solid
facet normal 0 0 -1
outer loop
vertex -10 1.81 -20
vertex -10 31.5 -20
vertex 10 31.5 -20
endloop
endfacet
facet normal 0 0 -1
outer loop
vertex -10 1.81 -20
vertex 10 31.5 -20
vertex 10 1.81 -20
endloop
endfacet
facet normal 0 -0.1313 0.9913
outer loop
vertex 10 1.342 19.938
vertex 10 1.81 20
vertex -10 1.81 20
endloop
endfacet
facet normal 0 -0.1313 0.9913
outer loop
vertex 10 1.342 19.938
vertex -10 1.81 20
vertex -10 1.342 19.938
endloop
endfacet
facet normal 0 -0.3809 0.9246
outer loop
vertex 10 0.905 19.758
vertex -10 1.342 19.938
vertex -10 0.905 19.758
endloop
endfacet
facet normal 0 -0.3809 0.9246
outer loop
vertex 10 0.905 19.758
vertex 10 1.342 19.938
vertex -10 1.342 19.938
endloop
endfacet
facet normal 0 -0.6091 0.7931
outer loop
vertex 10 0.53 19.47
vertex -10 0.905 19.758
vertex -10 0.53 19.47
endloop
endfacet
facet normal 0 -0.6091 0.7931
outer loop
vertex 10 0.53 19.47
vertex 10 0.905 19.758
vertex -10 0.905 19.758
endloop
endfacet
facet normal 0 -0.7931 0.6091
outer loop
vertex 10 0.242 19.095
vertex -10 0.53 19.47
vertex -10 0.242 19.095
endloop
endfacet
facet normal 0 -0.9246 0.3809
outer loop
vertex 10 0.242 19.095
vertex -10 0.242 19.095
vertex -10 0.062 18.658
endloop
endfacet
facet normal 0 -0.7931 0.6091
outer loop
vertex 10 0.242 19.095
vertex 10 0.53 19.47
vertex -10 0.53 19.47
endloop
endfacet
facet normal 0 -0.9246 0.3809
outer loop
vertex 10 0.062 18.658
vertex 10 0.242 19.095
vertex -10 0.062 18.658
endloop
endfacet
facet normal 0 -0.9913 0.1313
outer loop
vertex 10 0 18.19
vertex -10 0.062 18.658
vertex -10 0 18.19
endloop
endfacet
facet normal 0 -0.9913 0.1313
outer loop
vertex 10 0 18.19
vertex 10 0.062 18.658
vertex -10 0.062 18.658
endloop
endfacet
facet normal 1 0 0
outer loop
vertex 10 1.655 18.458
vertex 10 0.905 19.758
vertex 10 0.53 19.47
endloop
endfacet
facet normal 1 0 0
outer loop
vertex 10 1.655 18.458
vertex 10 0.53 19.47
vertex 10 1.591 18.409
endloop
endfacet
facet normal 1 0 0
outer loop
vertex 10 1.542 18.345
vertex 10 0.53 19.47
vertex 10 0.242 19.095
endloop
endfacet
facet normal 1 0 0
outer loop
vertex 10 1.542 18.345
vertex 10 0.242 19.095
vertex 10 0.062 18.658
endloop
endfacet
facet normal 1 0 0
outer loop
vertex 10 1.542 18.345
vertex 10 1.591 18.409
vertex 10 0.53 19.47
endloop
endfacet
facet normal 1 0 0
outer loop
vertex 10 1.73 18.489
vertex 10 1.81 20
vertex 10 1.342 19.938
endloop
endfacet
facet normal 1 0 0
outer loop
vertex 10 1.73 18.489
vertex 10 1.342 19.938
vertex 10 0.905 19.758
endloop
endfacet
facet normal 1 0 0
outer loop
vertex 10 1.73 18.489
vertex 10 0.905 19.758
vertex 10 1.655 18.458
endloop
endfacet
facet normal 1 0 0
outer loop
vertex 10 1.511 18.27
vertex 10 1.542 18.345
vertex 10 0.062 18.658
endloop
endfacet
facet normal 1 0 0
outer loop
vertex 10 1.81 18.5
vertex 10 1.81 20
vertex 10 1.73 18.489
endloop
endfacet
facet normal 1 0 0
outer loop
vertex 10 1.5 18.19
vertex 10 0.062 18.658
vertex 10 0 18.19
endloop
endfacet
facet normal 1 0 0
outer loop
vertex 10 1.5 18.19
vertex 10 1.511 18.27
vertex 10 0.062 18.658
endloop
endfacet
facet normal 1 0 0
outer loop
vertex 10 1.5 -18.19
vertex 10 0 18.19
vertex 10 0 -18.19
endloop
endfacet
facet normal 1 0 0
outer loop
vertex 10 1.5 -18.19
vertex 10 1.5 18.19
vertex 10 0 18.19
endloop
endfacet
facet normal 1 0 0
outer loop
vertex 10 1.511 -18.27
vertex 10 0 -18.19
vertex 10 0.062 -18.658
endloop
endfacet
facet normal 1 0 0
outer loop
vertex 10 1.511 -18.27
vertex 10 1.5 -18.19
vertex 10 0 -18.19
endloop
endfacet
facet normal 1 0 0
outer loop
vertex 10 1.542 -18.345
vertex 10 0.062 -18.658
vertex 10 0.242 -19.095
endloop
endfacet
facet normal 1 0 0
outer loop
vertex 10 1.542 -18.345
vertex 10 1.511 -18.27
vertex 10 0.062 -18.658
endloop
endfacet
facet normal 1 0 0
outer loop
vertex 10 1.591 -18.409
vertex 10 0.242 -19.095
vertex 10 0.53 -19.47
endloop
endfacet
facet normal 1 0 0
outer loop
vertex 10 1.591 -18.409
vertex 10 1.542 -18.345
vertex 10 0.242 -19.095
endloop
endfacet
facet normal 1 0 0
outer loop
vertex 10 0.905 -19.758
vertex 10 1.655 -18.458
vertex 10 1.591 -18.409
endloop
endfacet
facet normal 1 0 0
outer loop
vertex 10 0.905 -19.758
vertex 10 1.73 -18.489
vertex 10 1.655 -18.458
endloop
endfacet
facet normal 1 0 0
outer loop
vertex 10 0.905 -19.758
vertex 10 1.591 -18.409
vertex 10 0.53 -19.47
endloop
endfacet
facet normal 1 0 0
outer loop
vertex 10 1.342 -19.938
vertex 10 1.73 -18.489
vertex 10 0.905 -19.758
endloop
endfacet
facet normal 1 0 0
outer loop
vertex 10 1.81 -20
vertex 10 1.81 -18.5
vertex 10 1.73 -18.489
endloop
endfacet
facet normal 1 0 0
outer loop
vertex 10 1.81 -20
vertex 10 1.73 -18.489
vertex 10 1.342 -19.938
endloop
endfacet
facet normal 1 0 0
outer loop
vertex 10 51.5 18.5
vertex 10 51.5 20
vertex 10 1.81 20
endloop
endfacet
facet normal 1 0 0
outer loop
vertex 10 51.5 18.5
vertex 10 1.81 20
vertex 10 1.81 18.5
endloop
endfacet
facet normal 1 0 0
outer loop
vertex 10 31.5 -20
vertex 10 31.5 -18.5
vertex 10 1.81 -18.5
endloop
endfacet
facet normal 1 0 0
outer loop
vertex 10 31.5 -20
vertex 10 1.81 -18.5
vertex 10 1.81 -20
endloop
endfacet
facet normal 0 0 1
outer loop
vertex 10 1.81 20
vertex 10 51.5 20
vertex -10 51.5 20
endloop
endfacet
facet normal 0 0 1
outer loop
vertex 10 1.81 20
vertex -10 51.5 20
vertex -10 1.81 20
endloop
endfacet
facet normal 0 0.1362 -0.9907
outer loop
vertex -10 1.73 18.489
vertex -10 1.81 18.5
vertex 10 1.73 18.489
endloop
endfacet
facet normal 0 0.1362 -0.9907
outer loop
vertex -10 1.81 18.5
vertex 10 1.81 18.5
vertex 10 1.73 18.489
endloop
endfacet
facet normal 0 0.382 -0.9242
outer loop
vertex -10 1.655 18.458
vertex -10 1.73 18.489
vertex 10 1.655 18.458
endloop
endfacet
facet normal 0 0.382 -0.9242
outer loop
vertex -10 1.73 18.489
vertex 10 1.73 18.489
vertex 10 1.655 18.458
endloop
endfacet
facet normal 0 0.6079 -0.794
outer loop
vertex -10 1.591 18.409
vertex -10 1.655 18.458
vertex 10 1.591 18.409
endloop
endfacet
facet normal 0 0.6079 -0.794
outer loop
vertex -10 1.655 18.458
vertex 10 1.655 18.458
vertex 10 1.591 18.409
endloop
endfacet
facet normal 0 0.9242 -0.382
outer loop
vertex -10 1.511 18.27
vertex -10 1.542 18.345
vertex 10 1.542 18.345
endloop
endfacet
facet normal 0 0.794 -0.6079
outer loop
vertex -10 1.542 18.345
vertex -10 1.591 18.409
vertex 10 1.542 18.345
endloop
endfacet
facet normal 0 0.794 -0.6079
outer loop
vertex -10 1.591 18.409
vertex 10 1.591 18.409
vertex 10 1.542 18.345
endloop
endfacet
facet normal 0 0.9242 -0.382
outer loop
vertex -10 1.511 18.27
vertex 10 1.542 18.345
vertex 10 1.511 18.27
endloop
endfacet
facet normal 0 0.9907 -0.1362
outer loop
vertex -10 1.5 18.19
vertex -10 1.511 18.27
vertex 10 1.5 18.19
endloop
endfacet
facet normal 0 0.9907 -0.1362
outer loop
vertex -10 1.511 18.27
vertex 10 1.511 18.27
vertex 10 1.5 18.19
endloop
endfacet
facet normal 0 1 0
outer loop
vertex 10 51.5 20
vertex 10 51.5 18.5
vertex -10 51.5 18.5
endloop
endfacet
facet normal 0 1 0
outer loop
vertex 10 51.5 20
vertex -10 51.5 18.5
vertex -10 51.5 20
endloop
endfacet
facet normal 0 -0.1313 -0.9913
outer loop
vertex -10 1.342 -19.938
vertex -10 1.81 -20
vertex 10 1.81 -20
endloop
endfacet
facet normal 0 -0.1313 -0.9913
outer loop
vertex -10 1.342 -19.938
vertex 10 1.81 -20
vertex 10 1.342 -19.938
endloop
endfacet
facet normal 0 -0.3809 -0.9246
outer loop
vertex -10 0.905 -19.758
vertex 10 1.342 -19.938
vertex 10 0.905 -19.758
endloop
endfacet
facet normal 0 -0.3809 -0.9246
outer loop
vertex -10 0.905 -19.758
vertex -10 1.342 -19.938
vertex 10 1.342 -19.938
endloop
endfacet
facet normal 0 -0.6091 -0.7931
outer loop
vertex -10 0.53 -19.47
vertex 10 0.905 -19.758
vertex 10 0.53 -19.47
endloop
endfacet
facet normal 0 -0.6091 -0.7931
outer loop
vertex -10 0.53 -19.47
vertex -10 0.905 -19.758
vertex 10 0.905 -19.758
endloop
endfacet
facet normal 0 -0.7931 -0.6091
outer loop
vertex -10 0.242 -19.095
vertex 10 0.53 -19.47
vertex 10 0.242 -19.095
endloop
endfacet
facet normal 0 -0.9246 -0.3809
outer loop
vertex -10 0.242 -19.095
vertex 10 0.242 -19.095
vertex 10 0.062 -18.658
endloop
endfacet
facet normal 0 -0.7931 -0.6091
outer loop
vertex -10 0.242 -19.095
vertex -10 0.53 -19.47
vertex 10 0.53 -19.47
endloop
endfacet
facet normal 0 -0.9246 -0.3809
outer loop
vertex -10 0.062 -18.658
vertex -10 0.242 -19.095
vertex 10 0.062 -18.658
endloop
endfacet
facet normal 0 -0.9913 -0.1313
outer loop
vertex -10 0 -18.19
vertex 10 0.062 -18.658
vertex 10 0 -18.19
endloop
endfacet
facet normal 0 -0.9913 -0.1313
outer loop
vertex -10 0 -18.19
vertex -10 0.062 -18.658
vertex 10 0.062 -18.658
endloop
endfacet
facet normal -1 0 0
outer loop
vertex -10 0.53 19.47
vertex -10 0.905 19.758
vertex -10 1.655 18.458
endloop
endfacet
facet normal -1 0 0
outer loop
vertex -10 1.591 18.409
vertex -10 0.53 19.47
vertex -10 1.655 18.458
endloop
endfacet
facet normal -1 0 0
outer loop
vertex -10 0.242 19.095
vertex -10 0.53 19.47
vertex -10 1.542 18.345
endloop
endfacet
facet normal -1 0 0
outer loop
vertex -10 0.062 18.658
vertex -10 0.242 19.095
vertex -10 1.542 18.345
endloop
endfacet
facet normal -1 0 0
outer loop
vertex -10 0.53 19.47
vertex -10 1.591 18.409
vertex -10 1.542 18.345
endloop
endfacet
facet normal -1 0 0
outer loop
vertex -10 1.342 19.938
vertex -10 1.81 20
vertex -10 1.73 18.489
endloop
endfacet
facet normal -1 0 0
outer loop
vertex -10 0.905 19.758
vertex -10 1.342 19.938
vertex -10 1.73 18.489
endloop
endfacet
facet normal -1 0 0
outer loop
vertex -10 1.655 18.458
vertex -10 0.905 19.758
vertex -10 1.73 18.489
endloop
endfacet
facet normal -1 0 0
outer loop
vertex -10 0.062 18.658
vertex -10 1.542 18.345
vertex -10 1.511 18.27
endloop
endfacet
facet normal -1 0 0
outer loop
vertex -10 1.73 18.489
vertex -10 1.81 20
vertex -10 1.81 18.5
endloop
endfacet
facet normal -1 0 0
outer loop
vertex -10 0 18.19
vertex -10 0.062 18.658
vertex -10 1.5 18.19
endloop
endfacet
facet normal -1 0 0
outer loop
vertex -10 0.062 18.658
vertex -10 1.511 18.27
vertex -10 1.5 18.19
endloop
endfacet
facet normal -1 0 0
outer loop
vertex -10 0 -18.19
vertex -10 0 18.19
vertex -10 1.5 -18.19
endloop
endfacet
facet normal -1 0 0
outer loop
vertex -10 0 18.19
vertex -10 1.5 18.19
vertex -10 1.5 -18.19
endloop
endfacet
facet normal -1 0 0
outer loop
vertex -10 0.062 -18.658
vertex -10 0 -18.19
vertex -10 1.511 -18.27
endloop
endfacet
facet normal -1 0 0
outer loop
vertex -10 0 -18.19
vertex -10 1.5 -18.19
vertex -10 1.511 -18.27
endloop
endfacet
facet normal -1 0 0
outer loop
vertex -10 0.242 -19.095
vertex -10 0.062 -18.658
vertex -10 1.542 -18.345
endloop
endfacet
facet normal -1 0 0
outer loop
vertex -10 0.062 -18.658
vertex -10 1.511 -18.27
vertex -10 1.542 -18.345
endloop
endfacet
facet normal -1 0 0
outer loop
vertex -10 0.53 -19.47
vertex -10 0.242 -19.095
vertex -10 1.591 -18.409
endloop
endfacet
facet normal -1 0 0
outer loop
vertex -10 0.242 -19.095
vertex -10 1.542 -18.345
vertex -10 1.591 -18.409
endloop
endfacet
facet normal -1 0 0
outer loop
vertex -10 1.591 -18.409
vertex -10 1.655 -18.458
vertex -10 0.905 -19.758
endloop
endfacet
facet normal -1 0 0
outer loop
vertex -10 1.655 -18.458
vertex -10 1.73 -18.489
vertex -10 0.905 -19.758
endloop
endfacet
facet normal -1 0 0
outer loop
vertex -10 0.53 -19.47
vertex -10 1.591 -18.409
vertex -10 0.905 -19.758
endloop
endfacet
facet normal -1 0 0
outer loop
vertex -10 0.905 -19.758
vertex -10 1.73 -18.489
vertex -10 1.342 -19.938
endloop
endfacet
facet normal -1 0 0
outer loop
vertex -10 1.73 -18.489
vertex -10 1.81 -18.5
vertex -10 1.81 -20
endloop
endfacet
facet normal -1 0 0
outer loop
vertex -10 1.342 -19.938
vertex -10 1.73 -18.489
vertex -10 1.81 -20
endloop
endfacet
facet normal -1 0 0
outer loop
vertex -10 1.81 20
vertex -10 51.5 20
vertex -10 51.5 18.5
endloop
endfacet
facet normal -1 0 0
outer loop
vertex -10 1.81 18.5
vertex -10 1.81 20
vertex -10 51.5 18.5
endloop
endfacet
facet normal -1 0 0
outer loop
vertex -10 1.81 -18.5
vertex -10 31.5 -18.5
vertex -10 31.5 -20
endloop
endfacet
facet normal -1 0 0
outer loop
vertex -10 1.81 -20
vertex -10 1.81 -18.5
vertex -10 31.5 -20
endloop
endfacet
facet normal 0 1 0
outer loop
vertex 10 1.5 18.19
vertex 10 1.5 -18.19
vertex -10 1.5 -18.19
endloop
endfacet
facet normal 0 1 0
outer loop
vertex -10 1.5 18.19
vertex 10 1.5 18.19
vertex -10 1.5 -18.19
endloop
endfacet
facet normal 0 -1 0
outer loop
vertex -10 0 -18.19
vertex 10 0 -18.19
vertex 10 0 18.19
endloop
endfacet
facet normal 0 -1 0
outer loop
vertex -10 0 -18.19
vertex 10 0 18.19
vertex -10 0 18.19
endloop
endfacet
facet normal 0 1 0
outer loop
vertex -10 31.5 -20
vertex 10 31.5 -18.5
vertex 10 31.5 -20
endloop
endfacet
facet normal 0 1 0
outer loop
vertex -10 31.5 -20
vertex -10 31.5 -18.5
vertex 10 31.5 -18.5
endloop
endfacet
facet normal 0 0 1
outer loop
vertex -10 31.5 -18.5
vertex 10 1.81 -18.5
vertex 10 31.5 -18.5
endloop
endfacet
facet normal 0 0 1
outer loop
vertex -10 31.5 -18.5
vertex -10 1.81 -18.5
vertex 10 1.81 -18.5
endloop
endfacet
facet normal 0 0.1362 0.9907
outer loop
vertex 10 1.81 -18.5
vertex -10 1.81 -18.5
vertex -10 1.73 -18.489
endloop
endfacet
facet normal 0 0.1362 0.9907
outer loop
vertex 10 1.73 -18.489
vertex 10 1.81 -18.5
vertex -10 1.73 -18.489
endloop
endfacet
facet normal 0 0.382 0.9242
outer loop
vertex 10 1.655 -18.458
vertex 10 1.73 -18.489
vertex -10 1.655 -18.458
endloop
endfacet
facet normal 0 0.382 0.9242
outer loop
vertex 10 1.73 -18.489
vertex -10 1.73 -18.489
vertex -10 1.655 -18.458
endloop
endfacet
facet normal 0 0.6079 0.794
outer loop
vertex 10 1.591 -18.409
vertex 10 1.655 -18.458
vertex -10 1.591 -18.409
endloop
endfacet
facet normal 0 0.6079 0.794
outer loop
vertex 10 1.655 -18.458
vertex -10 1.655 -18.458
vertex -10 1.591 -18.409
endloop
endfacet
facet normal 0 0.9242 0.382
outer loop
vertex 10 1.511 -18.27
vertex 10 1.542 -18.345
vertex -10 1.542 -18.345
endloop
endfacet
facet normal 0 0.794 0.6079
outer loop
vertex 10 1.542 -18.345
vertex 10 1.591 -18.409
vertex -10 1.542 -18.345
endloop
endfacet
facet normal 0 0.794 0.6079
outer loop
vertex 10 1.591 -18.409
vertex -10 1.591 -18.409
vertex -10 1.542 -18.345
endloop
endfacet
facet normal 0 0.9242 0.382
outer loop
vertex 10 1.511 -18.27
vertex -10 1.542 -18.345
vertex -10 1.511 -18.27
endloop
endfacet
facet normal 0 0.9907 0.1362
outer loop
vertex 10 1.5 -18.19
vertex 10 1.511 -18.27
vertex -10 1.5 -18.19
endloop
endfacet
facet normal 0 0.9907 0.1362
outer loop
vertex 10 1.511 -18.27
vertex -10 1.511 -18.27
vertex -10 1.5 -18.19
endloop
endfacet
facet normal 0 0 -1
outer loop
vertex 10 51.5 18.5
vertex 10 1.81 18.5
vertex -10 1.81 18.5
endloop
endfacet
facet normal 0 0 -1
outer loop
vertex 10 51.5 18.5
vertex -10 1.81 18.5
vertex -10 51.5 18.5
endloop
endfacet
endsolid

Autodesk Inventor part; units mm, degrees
ref_plane "YZ Plane" through (0, 0, 0) normal (1, 0, 0) x (0, 1, 0)
ref_plane "XZ Plane" through (0, 0, 0) normal (0, 1, 0) x (-1, 0, 0)
ref_plane "XY Plane" through (0, 0, 0) normal (0, 0, 1) x (1, 0, 0)
sketch "Sketch1" plane through (0, 0, 0) normal (0, 1, 0) x (-1, 0, 0)
  line L0 (10, -18.5) -> (-10, -18.5)
  line L1 (-10, -18.5) -> (-10, 18.5)
  line L2 (-10, 18.5) -> (10, 18.5)
  line L3 (10, 18.5) -> (10, -18.5)
  point P0 (0, 0)
  dimension "d0" = 20
  dimension "d1" = 37
  dimension "d2" = 18.5
  dimension "d3" = 10
extrude "Plate1" add sketch "Sketch1" along normal blind 1.5
sketch "Sketch2" plane through (-10, 0, -20) normal (0, 0, 1) x (1, 0, 0)
  line L0 (20, 0) -> (0, 0)
  line L1 (0, 0) -> (0, 31.5)
  line L2 (0, 31.5) -> (20, 31.5)
  line L3 (20, 31.5) -> (20, 0)
edge flange "Flange1" height 31.5 angle 90 thickness 1.5 bend radius 0.31 thickness toward (0, 0, 1) relief tear relief width 1.5 relief depth 0.75 edges at (0, 1.5, -18.5) wall of the first edge with corners at (10, 0, -20) (-10, 0, -20) (-10, 31.5, -20) (10, 31.5, -20)
bend "Bend1"
corner "Corner1"
sketch "Sketch3" plane through (10, 0, 20) normal (0, 0, -1) x (-1, 0, 0)
  line L0 (20, 0) -> (0, 0)
  line L1 (0, 0) -> (0, 51.5)
  line L2 (0, 51.5) -> (20, 51.5)
  line L3 (20, 51.5) -> (20, 0)
edge flange "Flange2" height 51.5 angle 90 thickness 1.5 bend radius 0.31 thickness toward (0, 0, -1) relief tear relief width 1.5 relief depth 0.75 edges at (0, 1.5, 18.5) wall of the first edge with corners at (-10, 0, 20) (10, 0, 20) (10, 51.5, 20) (-10, 51.5, 20)
bend "Bend2"
corner "Corner2"
equation "\"d4\" = Thickness"
equation "\"d5\" = BendReliefWidth"
equation "\"d6\" = BendReliefDepth"
equation "\"d7\" = MinimumRemnant"
equation "\"d8\" = TransitionRadius"
equation "\"d11\" = BendRadius"
equation "\"d12\" = CornerReliefSize"
equation "\"d13\" = GapSize"
equation "\"d14\" = JacobiRadiusSize"
equation "\"d15\" = BendReliefWidth"
equation "\"d16\" = BendReliefDepth"
equation "\"d17\" = MinimumRemnant"
equation "\"d18\" = TransitionRadius"
equation "\"d21\" = BendRadius"
equation "\"d22\" = CornerReliefSize"
equation "\"d23\" = GapSize"
equation "\"d24\" = JacobiRadiusSize"
equation "\"BendReliefWidth\" = Thickness"
equation "\"BendReliefDepth\" = 0.5 * Thickness"
equation "\"CornerReliefSize\" = 4 * Thickness"
equation "\"MinimumRemnant\" = 2 * Thickness"
equation "\"TransitionRadius\" = BendRadius"
equation "\"JacobiRadiusSize\" = BendRadius"
equation "\"GapSize\" = Thickness"
equation "\"Thickness\" = 1.5"
equation "\"BendRadius\" = 0.31"
properties part number "axis_9_bottom_frame" material "Aluminum 6061-AHC"
